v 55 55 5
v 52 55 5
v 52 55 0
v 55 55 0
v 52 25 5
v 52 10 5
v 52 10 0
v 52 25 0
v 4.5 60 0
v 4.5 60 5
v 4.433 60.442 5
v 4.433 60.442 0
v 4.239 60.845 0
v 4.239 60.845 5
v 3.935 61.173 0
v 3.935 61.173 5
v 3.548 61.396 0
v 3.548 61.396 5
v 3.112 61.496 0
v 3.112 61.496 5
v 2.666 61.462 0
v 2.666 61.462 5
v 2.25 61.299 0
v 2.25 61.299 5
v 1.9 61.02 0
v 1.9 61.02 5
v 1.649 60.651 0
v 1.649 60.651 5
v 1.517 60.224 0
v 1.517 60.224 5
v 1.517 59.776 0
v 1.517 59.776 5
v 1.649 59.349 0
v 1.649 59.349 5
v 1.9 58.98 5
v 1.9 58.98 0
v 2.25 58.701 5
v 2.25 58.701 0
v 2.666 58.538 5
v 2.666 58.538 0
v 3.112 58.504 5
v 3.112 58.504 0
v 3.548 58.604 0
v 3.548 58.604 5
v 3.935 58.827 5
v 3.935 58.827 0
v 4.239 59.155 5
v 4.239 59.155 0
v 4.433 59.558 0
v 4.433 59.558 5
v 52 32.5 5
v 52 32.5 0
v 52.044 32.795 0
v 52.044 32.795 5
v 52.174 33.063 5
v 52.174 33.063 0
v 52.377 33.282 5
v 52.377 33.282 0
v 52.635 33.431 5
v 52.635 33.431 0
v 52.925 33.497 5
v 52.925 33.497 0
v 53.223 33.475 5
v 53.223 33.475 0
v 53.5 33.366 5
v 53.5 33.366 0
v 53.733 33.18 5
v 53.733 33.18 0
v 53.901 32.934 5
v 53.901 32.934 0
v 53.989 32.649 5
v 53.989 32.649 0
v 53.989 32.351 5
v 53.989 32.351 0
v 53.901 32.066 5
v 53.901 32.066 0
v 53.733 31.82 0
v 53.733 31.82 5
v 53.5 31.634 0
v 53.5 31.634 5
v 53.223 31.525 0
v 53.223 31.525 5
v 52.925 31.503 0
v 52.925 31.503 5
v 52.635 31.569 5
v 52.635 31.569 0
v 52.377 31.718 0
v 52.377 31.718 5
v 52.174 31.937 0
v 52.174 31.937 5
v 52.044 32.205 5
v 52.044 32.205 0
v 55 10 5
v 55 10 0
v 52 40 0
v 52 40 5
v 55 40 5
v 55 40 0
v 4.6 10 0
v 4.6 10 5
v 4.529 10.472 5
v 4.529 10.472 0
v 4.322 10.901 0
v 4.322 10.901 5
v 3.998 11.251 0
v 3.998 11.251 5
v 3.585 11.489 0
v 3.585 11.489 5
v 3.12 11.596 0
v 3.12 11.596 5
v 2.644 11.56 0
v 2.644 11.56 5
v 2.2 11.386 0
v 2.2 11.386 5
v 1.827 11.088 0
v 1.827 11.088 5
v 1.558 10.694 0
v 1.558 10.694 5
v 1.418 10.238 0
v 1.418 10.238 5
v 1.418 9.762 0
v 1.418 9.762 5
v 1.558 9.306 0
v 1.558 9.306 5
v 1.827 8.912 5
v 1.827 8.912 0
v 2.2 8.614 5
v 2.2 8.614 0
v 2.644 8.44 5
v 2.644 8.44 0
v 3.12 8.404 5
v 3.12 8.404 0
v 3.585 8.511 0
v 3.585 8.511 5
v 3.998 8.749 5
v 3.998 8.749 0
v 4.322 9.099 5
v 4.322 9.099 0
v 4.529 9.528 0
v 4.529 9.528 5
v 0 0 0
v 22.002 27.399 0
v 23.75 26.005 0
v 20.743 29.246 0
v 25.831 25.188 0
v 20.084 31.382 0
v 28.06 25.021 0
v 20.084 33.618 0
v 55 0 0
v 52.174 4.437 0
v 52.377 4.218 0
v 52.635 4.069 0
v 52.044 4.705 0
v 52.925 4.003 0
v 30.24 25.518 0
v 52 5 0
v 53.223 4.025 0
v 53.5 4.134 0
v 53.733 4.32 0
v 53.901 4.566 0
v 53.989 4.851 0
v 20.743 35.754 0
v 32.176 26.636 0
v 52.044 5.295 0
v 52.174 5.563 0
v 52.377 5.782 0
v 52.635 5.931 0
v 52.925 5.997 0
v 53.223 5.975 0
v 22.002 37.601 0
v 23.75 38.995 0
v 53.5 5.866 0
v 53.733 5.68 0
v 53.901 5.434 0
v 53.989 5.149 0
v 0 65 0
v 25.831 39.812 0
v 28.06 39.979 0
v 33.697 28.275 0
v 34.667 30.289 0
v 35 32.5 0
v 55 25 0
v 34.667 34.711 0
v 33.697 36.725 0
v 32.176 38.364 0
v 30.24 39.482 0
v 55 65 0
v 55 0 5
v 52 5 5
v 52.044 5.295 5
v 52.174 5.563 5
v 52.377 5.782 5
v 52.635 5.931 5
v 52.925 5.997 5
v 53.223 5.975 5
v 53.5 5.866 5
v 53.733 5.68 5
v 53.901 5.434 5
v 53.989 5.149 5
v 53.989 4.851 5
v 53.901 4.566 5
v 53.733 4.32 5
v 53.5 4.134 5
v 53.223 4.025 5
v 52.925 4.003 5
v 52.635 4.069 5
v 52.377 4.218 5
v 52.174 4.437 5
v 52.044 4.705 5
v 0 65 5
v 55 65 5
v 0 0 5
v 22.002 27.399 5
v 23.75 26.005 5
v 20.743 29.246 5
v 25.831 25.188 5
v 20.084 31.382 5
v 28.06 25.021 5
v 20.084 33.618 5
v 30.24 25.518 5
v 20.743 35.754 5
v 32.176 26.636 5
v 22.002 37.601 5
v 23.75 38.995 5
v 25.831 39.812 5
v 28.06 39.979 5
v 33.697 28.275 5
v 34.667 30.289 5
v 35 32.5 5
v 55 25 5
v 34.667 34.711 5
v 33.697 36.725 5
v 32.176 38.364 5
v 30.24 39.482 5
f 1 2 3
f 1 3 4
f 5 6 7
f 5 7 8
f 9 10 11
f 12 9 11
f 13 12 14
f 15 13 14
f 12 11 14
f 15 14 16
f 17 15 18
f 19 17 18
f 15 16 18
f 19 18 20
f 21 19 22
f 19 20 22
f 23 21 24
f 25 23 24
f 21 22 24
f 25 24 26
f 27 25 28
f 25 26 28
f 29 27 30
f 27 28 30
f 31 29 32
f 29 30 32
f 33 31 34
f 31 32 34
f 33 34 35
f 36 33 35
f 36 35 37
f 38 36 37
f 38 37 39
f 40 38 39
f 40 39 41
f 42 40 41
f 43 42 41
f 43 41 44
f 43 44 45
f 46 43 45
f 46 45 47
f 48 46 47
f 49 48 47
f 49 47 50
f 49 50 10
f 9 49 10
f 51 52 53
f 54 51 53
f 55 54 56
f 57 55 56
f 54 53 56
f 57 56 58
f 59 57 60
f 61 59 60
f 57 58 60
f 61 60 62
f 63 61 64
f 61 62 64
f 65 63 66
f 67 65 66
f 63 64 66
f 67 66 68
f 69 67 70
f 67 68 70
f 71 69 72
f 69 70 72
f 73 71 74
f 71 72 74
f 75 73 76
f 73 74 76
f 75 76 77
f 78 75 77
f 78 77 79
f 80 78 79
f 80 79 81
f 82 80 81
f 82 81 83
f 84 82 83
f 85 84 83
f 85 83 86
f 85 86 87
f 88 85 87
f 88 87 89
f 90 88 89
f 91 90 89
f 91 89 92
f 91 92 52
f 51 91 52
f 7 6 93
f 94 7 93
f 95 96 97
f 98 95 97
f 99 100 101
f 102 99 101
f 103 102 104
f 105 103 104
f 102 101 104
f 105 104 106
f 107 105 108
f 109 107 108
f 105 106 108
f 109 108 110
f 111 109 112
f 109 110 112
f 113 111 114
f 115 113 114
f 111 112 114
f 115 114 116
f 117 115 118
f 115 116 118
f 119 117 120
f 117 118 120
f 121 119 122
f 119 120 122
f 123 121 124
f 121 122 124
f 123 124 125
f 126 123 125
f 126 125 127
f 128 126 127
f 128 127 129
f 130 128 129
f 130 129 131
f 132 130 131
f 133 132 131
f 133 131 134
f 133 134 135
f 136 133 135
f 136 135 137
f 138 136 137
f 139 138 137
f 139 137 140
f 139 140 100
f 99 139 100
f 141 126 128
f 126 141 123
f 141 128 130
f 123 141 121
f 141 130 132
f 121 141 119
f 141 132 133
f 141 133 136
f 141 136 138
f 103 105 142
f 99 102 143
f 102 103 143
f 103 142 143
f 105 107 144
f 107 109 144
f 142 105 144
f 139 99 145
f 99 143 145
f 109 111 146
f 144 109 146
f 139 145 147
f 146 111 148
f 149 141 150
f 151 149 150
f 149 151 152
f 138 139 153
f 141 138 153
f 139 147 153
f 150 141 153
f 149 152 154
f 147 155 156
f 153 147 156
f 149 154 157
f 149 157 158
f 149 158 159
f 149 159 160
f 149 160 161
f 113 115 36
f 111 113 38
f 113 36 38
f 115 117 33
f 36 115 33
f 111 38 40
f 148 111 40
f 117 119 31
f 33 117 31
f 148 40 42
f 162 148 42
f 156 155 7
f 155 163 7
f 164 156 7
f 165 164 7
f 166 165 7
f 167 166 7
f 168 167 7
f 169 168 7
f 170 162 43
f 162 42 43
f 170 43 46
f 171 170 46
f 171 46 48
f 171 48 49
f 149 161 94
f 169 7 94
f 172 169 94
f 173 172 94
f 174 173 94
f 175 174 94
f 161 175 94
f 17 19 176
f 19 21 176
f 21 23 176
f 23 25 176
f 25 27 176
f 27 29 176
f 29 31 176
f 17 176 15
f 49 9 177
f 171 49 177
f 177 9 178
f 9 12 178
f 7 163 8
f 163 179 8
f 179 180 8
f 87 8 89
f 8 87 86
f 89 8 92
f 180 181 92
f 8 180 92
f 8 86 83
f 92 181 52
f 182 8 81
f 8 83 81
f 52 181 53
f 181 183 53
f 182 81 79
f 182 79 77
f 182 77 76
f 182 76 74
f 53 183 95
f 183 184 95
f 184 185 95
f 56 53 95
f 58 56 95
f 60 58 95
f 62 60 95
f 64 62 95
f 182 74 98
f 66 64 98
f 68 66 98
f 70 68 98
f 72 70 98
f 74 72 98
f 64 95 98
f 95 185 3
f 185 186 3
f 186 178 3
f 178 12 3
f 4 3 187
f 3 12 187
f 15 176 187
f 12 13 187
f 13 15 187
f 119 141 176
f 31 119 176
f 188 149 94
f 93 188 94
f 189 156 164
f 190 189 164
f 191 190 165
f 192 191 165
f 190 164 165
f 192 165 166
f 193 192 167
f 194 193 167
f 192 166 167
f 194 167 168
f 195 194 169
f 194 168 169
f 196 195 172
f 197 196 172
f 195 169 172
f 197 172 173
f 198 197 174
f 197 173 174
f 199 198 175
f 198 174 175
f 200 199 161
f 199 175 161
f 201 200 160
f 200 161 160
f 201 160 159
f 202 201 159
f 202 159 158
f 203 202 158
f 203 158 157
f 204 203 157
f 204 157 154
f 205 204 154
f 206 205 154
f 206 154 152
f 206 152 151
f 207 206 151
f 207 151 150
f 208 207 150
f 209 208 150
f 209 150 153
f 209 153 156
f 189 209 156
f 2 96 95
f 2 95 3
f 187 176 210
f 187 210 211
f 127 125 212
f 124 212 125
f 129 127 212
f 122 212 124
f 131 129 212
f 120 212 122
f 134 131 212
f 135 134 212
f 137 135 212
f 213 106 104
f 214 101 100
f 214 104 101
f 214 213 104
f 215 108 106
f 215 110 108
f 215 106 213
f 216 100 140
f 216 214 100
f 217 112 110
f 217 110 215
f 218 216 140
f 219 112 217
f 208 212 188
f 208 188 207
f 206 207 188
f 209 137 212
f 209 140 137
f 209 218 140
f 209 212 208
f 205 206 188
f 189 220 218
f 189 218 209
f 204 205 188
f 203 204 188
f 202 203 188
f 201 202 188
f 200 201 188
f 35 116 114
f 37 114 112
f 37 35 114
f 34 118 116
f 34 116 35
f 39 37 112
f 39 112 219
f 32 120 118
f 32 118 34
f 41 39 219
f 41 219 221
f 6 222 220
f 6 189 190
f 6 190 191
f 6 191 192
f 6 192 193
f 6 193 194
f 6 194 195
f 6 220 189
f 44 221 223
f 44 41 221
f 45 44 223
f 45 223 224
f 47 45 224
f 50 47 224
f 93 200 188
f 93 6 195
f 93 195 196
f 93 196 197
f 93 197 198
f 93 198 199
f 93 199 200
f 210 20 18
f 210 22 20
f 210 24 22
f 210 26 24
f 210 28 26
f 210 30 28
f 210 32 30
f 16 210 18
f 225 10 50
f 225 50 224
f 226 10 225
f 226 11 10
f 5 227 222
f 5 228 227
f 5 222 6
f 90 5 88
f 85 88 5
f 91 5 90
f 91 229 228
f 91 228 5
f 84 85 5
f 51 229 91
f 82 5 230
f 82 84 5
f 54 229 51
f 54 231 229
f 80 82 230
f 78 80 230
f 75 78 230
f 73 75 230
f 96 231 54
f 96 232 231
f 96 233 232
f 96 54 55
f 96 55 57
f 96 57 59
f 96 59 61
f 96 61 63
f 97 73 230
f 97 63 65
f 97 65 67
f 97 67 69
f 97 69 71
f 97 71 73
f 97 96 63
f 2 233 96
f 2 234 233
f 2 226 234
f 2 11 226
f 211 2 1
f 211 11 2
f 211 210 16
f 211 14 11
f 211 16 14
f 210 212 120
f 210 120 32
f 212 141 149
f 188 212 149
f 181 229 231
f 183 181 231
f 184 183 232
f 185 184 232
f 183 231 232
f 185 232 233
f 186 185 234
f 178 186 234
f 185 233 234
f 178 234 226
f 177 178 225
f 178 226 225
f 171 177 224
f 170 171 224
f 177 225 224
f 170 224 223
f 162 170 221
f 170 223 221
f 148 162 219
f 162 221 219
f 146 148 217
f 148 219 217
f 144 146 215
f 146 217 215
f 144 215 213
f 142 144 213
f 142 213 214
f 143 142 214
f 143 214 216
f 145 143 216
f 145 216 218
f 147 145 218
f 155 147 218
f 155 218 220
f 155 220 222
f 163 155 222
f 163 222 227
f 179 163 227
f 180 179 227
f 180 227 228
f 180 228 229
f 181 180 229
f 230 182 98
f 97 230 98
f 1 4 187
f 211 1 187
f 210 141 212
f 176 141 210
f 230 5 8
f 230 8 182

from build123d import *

# Parameters (mm, degrees)
SKETCH_1_W          = 55
SKETCH_1_H          = 65
EXTRUDE_1_DEPTH     = 5
SKETCH_2_W          = 3
SKETCH_2_H          = 15
CUT_EXTRUDE_1_DEPTH = 86.293610546
SKETCH_4_R          = 7.5
CUT_EXTRUDE_2_DEPTH = 86.293610546
SKETCH_5_R          = 1.5
SKETCH_5_R_2        = 1.6
CUT_EXTRUDE_3_DEPTH = 86.293610546
SKETCH_6_R          = 1
CUT_EXTRUDE_4_DEPTH = 86.293610546


with BuildPart() as part:
    # 草图1 → 凸台-拉伸1 (new body)
    with BuildSketch(Plane.XY):
        with Locations((27.5, 32.5)):
            Rectangle(SKETCH_1_W, SKETCH_1_H)
    extrude(amount=EXTRUDE_1_DEPTH)

    # 草图2 → 切除-拉伸1 (cut, through all)
    with BuildSketch(Plane.XY.offset(5)):
        with Locations((53.5, 47.5)):
            Rectangle(SKETCH_2_W, SKETCH_2_H)
        with Locations((53.5, 17.5)):
            Rectangle(SKETCH_2_W, SKETCH_2_H)
    extrude(amount=-CUT_EXTRUDE_1_DEPTH, mode=Mode.SUBTRACT)

    # 草图4 → 切除-拉伸2 (cut, through all)
    with BuildSketch(Plane.XY.offset(5)):
        with Locations((27.5, 32.5)):
            Circle(SKETCH_4_R)
    extrude(amount=-CUT_EXTRUDE_2_DEPTH, mode=Mode.SUBTRACT)

    # 草图5 → 切除-拉伸3 (cut, through all)
    with BuildSketch(Plane.XY.offset(5)):
        with Locations((3, 60)):
            Circle(SKETCH_5_R)
        with Locations((3, 10)):
            Circle(SKETCH_5_R_2)
    extrude(amount=-CUT_EXTRUDE_3_DEPTH, mode=Mode.SUBTRACT)

    # 草图6 → 切除-拉伸4 (cut, through all)
    with BuildSketch(Plane(origin=(0, 0, 0), x_dir=(-1, 0, 0), z_dir=(0, 0, -1))):
        with Locations((-53, 32.5)):
            Circle(SKETCH_6_R)
        with Locations((-53, 5)):
            Circle(SKETCH_6_R)
    extrude(amount=-CUT_EXTRUDE_4_DEPTH, mode=Mode.SUBTRACT)


solid = part.part
